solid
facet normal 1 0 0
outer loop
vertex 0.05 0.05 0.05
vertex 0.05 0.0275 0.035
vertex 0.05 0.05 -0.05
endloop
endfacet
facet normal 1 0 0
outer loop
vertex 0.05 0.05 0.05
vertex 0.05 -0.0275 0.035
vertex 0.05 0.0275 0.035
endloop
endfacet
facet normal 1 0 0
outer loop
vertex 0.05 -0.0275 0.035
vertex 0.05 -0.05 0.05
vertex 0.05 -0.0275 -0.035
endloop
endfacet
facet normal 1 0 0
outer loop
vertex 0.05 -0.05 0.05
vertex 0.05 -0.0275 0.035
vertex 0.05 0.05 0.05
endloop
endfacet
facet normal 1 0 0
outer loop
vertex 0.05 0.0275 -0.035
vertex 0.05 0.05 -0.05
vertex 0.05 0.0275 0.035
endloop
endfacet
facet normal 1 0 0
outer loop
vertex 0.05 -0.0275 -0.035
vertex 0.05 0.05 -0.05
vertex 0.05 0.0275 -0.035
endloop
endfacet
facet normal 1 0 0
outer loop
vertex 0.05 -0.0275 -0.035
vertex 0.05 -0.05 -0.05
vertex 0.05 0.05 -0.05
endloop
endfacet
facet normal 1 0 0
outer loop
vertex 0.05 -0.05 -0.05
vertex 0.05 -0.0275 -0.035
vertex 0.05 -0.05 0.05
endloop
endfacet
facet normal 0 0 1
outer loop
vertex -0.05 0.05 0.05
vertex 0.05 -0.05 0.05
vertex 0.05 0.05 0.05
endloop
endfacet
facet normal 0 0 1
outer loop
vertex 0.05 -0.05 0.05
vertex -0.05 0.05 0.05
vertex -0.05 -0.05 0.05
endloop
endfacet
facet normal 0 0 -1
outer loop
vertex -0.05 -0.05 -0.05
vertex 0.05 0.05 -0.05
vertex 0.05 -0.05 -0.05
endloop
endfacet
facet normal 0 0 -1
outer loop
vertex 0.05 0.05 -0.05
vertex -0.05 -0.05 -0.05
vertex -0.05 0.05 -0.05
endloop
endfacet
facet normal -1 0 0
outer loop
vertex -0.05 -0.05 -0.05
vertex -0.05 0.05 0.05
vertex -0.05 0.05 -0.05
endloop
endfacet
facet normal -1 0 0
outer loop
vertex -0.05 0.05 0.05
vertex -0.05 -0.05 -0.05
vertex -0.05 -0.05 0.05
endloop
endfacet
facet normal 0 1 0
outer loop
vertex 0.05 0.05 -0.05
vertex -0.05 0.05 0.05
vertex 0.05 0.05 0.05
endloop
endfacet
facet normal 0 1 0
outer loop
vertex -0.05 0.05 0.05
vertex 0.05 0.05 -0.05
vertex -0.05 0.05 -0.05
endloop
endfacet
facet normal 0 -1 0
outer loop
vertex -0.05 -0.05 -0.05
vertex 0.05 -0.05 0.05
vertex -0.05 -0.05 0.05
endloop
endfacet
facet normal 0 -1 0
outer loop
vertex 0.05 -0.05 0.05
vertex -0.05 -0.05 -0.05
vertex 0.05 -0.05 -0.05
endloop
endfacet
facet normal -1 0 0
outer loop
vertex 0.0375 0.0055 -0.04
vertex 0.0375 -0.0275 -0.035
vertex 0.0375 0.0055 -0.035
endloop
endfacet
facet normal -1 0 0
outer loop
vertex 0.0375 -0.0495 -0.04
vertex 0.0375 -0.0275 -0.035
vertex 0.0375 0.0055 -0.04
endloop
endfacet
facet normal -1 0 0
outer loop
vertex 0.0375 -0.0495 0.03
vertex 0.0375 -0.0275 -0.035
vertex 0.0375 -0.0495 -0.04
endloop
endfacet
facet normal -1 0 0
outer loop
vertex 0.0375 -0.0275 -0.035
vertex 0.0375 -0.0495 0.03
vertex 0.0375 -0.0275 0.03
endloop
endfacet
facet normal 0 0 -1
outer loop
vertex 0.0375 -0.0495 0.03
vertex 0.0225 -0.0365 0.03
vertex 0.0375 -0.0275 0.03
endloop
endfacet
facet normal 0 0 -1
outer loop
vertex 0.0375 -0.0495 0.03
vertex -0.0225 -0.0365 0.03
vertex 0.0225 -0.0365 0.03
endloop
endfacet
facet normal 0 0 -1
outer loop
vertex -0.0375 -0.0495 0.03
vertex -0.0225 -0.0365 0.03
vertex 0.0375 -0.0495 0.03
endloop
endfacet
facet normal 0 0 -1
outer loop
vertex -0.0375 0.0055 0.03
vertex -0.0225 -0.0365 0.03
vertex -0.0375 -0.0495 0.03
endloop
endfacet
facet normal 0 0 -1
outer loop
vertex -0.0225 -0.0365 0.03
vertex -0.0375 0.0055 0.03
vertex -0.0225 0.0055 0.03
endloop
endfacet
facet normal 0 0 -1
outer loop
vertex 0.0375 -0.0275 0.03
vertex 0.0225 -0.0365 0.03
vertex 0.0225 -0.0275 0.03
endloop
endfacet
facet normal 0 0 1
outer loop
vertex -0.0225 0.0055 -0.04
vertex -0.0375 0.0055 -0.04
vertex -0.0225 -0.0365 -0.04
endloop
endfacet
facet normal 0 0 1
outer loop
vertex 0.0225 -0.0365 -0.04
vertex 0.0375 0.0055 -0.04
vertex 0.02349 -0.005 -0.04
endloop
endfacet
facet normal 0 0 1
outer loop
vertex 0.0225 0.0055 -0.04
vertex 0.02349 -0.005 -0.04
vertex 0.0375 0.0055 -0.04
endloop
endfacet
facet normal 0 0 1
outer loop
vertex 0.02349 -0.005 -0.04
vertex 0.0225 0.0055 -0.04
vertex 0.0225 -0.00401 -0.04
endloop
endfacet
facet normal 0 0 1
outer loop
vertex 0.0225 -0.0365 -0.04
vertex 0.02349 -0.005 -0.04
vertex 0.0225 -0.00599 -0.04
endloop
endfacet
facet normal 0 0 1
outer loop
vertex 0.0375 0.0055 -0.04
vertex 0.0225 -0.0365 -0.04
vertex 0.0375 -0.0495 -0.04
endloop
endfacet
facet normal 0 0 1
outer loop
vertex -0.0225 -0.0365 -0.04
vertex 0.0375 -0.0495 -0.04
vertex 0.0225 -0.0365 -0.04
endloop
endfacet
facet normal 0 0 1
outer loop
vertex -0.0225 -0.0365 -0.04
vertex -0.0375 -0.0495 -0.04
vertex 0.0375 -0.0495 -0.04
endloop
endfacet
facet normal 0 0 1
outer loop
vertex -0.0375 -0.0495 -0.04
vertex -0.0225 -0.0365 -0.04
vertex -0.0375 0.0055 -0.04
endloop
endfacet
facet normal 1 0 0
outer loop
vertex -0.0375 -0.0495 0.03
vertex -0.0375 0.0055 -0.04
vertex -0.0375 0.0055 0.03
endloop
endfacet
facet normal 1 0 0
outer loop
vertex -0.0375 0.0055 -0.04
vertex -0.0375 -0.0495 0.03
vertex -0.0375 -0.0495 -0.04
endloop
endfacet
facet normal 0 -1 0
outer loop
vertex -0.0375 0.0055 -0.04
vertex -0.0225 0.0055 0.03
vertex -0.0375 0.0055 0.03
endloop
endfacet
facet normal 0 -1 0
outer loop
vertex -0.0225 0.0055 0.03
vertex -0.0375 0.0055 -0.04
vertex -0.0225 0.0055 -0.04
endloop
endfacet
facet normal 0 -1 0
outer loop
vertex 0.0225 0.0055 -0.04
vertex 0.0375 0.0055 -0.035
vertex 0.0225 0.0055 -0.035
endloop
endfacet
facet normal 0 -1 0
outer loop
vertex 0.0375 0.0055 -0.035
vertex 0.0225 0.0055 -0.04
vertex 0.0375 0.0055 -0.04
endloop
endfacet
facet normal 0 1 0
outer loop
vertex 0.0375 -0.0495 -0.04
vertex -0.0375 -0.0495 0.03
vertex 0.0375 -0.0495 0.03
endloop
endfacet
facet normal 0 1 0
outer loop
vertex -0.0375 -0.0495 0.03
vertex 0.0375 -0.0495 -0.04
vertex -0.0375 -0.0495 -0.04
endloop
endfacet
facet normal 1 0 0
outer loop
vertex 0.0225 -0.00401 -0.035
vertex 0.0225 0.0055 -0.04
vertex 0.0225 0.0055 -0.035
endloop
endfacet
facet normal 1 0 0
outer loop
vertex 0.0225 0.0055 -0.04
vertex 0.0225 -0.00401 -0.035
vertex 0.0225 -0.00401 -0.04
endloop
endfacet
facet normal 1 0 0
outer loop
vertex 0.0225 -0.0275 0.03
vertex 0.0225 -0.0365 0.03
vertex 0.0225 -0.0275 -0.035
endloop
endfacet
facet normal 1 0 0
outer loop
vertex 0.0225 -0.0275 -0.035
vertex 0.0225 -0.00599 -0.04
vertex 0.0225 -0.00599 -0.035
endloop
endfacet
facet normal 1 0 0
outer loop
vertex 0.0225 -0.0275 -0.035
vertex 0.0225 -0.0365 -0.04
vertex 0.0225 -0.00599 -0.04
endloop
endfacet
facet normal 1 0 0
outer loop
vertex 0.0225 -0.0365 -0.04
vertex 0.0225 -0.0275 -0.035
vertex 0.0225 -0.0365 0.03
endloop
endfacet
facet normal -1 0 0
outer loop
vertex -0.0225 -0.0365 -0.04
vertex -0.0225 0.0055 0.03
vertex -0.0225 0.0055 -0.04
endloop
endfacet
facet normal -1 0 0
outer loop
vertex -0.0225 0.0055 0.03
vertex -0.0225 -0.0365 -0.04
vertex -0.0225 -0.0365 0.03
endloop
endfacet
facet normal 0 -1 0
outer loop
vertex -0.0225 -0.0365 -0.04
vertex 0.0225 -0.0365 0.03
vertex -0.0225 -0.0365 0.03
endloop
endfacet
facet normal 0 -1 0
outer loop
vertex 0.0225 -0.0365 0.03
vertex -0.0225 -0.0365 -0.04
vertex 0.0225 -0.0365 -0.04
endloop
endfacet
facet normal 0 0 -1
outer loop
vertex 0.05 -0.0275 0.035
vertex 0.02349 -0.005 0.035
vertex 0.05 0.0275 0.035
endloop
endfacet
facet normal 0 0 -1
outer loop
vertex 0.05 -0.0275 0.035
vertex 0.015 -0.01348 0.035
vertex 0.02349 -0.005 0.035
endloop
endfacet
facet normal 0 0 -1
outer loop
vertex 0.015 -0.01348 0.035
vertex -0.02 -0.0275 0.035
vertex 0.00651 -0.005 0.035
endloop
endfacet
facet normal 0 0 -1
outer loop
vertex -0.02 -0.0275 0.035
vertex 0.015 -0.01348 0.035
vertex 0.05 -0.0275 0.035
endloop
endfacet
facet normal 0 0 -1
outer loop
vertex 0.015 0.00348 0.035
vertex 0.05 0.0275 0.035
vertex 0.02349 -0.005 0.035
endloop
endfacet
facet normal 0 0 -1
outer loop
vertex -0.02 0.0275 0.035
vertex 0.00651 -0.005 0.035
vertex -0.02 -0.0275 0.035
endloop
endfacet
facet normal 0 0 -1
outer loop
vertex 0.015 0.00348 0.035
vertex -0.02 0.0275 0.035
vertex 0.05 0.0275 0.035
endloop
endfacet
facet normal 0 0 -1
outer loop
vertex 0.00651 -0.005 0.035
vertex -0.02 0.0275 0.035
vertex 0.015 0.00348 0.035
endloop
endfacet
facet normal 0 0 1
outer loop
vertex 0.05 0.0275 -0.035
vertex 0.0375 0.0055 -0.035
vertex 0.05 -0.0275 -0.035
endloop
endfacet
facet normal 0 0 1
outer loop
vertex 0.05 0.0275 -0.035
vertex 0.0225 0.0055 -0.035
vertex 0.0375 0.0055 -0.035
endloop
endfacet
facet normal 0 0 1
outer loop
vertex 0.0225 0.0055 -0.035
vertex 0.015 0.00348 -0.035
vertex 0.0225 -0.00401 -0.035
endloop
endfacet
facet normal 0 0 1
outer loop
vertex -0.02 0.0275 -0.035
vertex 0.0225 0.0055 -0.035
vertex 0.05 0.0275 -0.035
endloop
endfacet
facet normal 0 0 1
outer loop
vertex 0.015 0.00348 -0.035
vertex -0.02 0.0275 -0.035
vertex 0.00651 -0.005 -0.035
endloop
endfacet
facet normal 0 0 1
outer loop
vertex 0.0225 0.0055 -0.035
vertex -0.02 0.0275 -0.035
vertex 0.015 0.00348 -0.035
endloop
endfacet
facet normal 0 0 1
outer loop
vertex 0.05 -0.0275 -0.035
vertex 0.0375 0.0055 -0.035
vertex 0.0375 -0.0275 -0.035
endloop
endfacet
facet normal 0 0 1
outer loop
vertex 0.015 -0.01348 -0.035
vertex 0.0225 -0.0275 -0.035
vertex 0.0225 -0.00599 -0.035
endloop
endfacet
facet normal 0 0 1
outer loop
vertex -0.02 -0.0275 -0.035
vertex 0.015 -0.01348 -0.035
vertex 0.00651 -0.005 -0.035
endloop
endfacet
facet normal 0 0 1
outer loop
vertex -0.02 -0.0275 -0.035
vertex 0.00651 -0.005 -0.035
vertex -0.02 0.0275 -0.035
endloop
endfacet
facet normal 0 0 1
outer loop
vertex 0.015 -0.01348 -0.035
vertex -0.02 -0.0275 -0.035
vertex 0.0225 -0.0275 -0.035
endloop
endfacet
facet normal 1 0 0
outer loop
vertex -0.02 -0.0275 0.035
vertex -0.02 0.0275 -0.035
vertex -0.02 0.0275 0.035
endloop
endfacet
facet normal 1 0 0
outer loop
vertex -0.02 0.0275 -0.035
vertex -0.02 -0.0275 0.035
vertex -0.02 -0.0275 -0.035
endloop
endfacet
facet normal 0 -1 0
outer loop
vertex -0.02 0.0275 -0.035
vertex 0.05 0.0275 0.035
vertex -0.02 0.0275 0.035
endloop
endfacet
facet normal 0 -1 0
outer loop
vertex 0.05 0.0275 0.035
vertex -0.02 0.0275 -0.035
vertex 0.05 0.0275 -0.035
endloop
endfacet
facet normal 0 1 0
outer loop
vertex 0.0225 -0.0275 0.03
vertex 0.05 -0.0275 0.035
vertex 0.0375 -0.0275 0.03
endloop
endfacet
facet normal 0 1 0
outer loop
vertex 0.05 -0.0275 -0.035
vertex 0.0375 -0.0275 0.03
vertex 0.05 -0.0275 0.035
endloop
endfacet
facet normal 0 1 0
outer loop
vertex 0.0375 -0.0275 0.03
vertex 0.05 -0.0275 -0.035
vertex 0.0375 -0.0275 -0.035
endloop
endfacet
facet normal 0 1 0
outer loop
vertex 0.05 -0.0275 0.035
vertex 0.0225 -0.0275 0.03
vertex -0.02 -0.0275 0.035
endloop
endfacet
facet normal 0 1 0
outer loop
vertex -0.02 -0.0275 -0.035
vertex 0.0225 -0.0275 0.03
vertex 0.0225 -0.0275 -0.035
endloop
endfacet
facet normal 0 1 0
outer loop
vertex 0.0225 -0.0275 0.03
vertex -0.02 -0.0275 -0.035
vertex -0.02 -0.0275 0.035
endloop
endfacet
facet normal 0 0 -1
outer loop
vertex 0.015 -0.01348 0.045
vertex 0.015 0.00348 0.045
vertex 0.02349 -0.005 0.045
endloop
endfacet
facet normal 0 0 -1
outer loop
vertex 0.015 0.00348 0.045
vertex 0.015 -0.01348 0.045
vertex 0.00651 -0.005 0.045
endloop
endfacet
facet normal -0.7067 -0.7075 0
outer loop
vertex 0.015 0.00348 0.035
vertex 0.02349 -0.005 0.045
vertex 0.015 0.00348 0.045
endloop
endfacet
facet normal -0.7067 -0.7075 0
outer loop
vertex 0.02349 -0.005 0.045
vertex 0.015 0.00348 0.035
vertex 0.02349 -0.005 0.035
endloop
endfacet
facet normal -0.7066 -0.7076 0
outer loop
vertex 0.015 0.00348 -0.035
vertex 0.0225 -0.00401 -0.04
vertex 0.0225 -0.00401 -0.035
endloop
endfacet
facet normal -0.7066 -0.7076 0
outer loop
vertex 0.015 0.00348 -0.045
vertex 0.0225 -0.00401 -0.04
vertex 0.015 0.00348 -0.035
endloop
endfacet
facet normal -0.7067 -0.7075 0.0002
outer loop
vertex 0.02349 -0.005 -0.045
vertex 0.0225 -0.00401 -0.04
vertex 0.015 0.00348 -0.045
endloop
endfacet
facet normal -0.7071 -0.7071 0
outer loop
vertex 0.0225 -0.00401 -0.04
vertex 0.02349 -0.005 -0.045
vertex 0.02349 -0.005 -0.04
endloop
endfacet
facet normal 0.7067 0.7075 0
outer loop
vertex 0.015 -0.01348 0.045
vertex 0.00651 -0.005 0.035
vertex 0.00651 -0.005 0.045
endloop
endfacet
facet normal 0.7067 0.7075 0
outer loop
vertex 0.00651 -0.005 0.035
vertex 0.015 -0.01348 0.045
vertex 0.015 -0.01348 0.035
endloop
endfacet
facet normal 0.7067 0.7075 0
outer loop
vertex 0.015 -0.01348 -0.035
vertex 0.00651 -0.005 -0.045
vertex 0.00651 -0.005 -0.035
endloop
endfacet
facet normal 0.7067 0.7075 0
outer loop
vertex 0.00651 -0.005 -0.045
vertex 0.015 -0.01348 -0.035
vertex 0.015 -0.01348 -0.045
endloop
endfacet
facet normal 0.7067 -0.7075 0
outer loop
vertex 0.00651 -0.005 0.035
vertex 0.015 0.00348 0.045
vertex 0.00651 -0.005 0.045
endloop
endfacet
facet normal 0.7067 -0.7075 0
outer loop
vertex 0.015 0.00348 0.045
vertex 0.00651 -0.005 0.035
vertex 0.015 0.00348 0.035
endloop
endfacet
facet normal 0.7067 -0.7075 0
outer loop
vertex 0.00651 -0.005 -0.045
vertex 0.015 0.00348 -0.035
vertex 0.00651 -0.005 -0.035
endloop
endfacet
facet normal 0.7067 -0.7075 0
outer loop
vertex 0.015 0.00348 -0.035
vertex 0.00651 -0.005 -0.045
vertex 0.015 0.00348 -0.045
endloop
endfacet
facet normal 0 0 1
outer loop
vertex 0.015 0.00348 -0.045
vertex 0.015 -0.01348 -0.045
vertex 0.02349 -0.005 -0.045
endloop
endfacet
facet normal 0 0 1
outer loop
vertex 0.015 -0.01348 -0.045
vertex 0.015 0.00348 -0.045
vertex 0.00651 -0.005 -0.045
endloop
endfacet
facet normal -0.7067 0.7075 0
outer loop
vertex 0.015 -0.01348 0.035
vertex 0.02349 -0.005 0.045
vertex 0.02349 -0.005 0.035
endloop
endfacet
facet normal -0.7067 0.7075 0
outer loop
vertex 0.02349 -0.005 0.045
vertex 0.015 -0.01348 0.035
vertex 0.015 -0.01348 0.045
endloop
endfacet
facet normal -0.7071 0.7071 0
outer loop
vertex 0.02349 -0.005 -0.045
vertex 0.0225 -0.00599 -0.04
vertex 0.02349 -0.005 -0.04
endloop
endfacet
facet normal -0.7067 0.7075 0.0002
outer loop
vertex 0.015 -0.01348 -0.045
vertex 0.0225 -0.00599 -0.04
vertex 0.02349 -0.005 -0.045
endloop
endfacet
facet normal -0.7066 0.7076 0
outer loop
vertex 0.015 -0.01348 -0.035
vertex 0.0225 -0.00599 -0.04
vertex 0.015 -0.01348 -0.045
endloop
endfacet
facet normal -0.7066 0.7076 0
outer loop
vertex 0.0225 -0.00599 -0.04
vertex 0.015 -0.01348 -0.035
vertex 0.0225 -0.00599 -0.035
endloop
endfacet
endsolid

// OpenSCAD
$fn=64;

size = 0.1;

module chamfer_box(sz=[0.1,0.1,0.1], c=0.006) {
    x=sz[0]; y=sz[1]; z=sz[2];
    intersection() {
        cube([x,y,z], center=true);
        union() {
            cube([x-2*c, y, z], center=true);
            cube([x, y-2*c, z], center=true);
            cube([x, y, z-2*c], center=true);
            rotate([0,0,45]) cube([x*2, y*2, z], center=true);
            rotate([0,0,-45]) cube([x*2, y*2, z], center=true);
            rotate([45,0,0]) cube([x*2, y, z*2], center=true);
            rotate([-45,0,0]) cube([x*2, y, z*2], center=true);
            rotate([0,45,0]) cube([x, y*2, z*2], center=true);
            rotate([0,-45,0]) cube([x, y*2, z*2], center=true);
        }
    }
}

module l_body() {
    union() {
        translate([0,0,0]) cube([size, size, size], center=true);
        translate([0,0,-size*0.25]) cube([size*0.7, size*0.7, size*0.5], center=true);
    }
}

module side_notch() {
    translate([size*0.15, 0, 0])
        cube([size*0.7, size*0.55, size*0.7], center=true);
}

module u_recess_back() {
    translate([0, -size*0.22, -size*0.05]) {
        difference() {
            cube([size*0.75, size*0.55, size*0.7], center=true);
            translate([0, size*0.08, 0])
                cube([size*0.45, size*0.45, size*0.75], center=true);
        }
    }
}

module internal_chamfer_cut() {
    translate([size*0.15, -size*0.05, 0])
        rotate([0,0,45])
            cube([size*0.12, size*0.12, size*0.9], center=true);
}

difference() {
    intersection() {
        l_body();
        chamfer_box([size,size,size], c=size*0.06);
    }
    side_notch();
    u_recess_back();
    internal_chamfer_cut();
}
